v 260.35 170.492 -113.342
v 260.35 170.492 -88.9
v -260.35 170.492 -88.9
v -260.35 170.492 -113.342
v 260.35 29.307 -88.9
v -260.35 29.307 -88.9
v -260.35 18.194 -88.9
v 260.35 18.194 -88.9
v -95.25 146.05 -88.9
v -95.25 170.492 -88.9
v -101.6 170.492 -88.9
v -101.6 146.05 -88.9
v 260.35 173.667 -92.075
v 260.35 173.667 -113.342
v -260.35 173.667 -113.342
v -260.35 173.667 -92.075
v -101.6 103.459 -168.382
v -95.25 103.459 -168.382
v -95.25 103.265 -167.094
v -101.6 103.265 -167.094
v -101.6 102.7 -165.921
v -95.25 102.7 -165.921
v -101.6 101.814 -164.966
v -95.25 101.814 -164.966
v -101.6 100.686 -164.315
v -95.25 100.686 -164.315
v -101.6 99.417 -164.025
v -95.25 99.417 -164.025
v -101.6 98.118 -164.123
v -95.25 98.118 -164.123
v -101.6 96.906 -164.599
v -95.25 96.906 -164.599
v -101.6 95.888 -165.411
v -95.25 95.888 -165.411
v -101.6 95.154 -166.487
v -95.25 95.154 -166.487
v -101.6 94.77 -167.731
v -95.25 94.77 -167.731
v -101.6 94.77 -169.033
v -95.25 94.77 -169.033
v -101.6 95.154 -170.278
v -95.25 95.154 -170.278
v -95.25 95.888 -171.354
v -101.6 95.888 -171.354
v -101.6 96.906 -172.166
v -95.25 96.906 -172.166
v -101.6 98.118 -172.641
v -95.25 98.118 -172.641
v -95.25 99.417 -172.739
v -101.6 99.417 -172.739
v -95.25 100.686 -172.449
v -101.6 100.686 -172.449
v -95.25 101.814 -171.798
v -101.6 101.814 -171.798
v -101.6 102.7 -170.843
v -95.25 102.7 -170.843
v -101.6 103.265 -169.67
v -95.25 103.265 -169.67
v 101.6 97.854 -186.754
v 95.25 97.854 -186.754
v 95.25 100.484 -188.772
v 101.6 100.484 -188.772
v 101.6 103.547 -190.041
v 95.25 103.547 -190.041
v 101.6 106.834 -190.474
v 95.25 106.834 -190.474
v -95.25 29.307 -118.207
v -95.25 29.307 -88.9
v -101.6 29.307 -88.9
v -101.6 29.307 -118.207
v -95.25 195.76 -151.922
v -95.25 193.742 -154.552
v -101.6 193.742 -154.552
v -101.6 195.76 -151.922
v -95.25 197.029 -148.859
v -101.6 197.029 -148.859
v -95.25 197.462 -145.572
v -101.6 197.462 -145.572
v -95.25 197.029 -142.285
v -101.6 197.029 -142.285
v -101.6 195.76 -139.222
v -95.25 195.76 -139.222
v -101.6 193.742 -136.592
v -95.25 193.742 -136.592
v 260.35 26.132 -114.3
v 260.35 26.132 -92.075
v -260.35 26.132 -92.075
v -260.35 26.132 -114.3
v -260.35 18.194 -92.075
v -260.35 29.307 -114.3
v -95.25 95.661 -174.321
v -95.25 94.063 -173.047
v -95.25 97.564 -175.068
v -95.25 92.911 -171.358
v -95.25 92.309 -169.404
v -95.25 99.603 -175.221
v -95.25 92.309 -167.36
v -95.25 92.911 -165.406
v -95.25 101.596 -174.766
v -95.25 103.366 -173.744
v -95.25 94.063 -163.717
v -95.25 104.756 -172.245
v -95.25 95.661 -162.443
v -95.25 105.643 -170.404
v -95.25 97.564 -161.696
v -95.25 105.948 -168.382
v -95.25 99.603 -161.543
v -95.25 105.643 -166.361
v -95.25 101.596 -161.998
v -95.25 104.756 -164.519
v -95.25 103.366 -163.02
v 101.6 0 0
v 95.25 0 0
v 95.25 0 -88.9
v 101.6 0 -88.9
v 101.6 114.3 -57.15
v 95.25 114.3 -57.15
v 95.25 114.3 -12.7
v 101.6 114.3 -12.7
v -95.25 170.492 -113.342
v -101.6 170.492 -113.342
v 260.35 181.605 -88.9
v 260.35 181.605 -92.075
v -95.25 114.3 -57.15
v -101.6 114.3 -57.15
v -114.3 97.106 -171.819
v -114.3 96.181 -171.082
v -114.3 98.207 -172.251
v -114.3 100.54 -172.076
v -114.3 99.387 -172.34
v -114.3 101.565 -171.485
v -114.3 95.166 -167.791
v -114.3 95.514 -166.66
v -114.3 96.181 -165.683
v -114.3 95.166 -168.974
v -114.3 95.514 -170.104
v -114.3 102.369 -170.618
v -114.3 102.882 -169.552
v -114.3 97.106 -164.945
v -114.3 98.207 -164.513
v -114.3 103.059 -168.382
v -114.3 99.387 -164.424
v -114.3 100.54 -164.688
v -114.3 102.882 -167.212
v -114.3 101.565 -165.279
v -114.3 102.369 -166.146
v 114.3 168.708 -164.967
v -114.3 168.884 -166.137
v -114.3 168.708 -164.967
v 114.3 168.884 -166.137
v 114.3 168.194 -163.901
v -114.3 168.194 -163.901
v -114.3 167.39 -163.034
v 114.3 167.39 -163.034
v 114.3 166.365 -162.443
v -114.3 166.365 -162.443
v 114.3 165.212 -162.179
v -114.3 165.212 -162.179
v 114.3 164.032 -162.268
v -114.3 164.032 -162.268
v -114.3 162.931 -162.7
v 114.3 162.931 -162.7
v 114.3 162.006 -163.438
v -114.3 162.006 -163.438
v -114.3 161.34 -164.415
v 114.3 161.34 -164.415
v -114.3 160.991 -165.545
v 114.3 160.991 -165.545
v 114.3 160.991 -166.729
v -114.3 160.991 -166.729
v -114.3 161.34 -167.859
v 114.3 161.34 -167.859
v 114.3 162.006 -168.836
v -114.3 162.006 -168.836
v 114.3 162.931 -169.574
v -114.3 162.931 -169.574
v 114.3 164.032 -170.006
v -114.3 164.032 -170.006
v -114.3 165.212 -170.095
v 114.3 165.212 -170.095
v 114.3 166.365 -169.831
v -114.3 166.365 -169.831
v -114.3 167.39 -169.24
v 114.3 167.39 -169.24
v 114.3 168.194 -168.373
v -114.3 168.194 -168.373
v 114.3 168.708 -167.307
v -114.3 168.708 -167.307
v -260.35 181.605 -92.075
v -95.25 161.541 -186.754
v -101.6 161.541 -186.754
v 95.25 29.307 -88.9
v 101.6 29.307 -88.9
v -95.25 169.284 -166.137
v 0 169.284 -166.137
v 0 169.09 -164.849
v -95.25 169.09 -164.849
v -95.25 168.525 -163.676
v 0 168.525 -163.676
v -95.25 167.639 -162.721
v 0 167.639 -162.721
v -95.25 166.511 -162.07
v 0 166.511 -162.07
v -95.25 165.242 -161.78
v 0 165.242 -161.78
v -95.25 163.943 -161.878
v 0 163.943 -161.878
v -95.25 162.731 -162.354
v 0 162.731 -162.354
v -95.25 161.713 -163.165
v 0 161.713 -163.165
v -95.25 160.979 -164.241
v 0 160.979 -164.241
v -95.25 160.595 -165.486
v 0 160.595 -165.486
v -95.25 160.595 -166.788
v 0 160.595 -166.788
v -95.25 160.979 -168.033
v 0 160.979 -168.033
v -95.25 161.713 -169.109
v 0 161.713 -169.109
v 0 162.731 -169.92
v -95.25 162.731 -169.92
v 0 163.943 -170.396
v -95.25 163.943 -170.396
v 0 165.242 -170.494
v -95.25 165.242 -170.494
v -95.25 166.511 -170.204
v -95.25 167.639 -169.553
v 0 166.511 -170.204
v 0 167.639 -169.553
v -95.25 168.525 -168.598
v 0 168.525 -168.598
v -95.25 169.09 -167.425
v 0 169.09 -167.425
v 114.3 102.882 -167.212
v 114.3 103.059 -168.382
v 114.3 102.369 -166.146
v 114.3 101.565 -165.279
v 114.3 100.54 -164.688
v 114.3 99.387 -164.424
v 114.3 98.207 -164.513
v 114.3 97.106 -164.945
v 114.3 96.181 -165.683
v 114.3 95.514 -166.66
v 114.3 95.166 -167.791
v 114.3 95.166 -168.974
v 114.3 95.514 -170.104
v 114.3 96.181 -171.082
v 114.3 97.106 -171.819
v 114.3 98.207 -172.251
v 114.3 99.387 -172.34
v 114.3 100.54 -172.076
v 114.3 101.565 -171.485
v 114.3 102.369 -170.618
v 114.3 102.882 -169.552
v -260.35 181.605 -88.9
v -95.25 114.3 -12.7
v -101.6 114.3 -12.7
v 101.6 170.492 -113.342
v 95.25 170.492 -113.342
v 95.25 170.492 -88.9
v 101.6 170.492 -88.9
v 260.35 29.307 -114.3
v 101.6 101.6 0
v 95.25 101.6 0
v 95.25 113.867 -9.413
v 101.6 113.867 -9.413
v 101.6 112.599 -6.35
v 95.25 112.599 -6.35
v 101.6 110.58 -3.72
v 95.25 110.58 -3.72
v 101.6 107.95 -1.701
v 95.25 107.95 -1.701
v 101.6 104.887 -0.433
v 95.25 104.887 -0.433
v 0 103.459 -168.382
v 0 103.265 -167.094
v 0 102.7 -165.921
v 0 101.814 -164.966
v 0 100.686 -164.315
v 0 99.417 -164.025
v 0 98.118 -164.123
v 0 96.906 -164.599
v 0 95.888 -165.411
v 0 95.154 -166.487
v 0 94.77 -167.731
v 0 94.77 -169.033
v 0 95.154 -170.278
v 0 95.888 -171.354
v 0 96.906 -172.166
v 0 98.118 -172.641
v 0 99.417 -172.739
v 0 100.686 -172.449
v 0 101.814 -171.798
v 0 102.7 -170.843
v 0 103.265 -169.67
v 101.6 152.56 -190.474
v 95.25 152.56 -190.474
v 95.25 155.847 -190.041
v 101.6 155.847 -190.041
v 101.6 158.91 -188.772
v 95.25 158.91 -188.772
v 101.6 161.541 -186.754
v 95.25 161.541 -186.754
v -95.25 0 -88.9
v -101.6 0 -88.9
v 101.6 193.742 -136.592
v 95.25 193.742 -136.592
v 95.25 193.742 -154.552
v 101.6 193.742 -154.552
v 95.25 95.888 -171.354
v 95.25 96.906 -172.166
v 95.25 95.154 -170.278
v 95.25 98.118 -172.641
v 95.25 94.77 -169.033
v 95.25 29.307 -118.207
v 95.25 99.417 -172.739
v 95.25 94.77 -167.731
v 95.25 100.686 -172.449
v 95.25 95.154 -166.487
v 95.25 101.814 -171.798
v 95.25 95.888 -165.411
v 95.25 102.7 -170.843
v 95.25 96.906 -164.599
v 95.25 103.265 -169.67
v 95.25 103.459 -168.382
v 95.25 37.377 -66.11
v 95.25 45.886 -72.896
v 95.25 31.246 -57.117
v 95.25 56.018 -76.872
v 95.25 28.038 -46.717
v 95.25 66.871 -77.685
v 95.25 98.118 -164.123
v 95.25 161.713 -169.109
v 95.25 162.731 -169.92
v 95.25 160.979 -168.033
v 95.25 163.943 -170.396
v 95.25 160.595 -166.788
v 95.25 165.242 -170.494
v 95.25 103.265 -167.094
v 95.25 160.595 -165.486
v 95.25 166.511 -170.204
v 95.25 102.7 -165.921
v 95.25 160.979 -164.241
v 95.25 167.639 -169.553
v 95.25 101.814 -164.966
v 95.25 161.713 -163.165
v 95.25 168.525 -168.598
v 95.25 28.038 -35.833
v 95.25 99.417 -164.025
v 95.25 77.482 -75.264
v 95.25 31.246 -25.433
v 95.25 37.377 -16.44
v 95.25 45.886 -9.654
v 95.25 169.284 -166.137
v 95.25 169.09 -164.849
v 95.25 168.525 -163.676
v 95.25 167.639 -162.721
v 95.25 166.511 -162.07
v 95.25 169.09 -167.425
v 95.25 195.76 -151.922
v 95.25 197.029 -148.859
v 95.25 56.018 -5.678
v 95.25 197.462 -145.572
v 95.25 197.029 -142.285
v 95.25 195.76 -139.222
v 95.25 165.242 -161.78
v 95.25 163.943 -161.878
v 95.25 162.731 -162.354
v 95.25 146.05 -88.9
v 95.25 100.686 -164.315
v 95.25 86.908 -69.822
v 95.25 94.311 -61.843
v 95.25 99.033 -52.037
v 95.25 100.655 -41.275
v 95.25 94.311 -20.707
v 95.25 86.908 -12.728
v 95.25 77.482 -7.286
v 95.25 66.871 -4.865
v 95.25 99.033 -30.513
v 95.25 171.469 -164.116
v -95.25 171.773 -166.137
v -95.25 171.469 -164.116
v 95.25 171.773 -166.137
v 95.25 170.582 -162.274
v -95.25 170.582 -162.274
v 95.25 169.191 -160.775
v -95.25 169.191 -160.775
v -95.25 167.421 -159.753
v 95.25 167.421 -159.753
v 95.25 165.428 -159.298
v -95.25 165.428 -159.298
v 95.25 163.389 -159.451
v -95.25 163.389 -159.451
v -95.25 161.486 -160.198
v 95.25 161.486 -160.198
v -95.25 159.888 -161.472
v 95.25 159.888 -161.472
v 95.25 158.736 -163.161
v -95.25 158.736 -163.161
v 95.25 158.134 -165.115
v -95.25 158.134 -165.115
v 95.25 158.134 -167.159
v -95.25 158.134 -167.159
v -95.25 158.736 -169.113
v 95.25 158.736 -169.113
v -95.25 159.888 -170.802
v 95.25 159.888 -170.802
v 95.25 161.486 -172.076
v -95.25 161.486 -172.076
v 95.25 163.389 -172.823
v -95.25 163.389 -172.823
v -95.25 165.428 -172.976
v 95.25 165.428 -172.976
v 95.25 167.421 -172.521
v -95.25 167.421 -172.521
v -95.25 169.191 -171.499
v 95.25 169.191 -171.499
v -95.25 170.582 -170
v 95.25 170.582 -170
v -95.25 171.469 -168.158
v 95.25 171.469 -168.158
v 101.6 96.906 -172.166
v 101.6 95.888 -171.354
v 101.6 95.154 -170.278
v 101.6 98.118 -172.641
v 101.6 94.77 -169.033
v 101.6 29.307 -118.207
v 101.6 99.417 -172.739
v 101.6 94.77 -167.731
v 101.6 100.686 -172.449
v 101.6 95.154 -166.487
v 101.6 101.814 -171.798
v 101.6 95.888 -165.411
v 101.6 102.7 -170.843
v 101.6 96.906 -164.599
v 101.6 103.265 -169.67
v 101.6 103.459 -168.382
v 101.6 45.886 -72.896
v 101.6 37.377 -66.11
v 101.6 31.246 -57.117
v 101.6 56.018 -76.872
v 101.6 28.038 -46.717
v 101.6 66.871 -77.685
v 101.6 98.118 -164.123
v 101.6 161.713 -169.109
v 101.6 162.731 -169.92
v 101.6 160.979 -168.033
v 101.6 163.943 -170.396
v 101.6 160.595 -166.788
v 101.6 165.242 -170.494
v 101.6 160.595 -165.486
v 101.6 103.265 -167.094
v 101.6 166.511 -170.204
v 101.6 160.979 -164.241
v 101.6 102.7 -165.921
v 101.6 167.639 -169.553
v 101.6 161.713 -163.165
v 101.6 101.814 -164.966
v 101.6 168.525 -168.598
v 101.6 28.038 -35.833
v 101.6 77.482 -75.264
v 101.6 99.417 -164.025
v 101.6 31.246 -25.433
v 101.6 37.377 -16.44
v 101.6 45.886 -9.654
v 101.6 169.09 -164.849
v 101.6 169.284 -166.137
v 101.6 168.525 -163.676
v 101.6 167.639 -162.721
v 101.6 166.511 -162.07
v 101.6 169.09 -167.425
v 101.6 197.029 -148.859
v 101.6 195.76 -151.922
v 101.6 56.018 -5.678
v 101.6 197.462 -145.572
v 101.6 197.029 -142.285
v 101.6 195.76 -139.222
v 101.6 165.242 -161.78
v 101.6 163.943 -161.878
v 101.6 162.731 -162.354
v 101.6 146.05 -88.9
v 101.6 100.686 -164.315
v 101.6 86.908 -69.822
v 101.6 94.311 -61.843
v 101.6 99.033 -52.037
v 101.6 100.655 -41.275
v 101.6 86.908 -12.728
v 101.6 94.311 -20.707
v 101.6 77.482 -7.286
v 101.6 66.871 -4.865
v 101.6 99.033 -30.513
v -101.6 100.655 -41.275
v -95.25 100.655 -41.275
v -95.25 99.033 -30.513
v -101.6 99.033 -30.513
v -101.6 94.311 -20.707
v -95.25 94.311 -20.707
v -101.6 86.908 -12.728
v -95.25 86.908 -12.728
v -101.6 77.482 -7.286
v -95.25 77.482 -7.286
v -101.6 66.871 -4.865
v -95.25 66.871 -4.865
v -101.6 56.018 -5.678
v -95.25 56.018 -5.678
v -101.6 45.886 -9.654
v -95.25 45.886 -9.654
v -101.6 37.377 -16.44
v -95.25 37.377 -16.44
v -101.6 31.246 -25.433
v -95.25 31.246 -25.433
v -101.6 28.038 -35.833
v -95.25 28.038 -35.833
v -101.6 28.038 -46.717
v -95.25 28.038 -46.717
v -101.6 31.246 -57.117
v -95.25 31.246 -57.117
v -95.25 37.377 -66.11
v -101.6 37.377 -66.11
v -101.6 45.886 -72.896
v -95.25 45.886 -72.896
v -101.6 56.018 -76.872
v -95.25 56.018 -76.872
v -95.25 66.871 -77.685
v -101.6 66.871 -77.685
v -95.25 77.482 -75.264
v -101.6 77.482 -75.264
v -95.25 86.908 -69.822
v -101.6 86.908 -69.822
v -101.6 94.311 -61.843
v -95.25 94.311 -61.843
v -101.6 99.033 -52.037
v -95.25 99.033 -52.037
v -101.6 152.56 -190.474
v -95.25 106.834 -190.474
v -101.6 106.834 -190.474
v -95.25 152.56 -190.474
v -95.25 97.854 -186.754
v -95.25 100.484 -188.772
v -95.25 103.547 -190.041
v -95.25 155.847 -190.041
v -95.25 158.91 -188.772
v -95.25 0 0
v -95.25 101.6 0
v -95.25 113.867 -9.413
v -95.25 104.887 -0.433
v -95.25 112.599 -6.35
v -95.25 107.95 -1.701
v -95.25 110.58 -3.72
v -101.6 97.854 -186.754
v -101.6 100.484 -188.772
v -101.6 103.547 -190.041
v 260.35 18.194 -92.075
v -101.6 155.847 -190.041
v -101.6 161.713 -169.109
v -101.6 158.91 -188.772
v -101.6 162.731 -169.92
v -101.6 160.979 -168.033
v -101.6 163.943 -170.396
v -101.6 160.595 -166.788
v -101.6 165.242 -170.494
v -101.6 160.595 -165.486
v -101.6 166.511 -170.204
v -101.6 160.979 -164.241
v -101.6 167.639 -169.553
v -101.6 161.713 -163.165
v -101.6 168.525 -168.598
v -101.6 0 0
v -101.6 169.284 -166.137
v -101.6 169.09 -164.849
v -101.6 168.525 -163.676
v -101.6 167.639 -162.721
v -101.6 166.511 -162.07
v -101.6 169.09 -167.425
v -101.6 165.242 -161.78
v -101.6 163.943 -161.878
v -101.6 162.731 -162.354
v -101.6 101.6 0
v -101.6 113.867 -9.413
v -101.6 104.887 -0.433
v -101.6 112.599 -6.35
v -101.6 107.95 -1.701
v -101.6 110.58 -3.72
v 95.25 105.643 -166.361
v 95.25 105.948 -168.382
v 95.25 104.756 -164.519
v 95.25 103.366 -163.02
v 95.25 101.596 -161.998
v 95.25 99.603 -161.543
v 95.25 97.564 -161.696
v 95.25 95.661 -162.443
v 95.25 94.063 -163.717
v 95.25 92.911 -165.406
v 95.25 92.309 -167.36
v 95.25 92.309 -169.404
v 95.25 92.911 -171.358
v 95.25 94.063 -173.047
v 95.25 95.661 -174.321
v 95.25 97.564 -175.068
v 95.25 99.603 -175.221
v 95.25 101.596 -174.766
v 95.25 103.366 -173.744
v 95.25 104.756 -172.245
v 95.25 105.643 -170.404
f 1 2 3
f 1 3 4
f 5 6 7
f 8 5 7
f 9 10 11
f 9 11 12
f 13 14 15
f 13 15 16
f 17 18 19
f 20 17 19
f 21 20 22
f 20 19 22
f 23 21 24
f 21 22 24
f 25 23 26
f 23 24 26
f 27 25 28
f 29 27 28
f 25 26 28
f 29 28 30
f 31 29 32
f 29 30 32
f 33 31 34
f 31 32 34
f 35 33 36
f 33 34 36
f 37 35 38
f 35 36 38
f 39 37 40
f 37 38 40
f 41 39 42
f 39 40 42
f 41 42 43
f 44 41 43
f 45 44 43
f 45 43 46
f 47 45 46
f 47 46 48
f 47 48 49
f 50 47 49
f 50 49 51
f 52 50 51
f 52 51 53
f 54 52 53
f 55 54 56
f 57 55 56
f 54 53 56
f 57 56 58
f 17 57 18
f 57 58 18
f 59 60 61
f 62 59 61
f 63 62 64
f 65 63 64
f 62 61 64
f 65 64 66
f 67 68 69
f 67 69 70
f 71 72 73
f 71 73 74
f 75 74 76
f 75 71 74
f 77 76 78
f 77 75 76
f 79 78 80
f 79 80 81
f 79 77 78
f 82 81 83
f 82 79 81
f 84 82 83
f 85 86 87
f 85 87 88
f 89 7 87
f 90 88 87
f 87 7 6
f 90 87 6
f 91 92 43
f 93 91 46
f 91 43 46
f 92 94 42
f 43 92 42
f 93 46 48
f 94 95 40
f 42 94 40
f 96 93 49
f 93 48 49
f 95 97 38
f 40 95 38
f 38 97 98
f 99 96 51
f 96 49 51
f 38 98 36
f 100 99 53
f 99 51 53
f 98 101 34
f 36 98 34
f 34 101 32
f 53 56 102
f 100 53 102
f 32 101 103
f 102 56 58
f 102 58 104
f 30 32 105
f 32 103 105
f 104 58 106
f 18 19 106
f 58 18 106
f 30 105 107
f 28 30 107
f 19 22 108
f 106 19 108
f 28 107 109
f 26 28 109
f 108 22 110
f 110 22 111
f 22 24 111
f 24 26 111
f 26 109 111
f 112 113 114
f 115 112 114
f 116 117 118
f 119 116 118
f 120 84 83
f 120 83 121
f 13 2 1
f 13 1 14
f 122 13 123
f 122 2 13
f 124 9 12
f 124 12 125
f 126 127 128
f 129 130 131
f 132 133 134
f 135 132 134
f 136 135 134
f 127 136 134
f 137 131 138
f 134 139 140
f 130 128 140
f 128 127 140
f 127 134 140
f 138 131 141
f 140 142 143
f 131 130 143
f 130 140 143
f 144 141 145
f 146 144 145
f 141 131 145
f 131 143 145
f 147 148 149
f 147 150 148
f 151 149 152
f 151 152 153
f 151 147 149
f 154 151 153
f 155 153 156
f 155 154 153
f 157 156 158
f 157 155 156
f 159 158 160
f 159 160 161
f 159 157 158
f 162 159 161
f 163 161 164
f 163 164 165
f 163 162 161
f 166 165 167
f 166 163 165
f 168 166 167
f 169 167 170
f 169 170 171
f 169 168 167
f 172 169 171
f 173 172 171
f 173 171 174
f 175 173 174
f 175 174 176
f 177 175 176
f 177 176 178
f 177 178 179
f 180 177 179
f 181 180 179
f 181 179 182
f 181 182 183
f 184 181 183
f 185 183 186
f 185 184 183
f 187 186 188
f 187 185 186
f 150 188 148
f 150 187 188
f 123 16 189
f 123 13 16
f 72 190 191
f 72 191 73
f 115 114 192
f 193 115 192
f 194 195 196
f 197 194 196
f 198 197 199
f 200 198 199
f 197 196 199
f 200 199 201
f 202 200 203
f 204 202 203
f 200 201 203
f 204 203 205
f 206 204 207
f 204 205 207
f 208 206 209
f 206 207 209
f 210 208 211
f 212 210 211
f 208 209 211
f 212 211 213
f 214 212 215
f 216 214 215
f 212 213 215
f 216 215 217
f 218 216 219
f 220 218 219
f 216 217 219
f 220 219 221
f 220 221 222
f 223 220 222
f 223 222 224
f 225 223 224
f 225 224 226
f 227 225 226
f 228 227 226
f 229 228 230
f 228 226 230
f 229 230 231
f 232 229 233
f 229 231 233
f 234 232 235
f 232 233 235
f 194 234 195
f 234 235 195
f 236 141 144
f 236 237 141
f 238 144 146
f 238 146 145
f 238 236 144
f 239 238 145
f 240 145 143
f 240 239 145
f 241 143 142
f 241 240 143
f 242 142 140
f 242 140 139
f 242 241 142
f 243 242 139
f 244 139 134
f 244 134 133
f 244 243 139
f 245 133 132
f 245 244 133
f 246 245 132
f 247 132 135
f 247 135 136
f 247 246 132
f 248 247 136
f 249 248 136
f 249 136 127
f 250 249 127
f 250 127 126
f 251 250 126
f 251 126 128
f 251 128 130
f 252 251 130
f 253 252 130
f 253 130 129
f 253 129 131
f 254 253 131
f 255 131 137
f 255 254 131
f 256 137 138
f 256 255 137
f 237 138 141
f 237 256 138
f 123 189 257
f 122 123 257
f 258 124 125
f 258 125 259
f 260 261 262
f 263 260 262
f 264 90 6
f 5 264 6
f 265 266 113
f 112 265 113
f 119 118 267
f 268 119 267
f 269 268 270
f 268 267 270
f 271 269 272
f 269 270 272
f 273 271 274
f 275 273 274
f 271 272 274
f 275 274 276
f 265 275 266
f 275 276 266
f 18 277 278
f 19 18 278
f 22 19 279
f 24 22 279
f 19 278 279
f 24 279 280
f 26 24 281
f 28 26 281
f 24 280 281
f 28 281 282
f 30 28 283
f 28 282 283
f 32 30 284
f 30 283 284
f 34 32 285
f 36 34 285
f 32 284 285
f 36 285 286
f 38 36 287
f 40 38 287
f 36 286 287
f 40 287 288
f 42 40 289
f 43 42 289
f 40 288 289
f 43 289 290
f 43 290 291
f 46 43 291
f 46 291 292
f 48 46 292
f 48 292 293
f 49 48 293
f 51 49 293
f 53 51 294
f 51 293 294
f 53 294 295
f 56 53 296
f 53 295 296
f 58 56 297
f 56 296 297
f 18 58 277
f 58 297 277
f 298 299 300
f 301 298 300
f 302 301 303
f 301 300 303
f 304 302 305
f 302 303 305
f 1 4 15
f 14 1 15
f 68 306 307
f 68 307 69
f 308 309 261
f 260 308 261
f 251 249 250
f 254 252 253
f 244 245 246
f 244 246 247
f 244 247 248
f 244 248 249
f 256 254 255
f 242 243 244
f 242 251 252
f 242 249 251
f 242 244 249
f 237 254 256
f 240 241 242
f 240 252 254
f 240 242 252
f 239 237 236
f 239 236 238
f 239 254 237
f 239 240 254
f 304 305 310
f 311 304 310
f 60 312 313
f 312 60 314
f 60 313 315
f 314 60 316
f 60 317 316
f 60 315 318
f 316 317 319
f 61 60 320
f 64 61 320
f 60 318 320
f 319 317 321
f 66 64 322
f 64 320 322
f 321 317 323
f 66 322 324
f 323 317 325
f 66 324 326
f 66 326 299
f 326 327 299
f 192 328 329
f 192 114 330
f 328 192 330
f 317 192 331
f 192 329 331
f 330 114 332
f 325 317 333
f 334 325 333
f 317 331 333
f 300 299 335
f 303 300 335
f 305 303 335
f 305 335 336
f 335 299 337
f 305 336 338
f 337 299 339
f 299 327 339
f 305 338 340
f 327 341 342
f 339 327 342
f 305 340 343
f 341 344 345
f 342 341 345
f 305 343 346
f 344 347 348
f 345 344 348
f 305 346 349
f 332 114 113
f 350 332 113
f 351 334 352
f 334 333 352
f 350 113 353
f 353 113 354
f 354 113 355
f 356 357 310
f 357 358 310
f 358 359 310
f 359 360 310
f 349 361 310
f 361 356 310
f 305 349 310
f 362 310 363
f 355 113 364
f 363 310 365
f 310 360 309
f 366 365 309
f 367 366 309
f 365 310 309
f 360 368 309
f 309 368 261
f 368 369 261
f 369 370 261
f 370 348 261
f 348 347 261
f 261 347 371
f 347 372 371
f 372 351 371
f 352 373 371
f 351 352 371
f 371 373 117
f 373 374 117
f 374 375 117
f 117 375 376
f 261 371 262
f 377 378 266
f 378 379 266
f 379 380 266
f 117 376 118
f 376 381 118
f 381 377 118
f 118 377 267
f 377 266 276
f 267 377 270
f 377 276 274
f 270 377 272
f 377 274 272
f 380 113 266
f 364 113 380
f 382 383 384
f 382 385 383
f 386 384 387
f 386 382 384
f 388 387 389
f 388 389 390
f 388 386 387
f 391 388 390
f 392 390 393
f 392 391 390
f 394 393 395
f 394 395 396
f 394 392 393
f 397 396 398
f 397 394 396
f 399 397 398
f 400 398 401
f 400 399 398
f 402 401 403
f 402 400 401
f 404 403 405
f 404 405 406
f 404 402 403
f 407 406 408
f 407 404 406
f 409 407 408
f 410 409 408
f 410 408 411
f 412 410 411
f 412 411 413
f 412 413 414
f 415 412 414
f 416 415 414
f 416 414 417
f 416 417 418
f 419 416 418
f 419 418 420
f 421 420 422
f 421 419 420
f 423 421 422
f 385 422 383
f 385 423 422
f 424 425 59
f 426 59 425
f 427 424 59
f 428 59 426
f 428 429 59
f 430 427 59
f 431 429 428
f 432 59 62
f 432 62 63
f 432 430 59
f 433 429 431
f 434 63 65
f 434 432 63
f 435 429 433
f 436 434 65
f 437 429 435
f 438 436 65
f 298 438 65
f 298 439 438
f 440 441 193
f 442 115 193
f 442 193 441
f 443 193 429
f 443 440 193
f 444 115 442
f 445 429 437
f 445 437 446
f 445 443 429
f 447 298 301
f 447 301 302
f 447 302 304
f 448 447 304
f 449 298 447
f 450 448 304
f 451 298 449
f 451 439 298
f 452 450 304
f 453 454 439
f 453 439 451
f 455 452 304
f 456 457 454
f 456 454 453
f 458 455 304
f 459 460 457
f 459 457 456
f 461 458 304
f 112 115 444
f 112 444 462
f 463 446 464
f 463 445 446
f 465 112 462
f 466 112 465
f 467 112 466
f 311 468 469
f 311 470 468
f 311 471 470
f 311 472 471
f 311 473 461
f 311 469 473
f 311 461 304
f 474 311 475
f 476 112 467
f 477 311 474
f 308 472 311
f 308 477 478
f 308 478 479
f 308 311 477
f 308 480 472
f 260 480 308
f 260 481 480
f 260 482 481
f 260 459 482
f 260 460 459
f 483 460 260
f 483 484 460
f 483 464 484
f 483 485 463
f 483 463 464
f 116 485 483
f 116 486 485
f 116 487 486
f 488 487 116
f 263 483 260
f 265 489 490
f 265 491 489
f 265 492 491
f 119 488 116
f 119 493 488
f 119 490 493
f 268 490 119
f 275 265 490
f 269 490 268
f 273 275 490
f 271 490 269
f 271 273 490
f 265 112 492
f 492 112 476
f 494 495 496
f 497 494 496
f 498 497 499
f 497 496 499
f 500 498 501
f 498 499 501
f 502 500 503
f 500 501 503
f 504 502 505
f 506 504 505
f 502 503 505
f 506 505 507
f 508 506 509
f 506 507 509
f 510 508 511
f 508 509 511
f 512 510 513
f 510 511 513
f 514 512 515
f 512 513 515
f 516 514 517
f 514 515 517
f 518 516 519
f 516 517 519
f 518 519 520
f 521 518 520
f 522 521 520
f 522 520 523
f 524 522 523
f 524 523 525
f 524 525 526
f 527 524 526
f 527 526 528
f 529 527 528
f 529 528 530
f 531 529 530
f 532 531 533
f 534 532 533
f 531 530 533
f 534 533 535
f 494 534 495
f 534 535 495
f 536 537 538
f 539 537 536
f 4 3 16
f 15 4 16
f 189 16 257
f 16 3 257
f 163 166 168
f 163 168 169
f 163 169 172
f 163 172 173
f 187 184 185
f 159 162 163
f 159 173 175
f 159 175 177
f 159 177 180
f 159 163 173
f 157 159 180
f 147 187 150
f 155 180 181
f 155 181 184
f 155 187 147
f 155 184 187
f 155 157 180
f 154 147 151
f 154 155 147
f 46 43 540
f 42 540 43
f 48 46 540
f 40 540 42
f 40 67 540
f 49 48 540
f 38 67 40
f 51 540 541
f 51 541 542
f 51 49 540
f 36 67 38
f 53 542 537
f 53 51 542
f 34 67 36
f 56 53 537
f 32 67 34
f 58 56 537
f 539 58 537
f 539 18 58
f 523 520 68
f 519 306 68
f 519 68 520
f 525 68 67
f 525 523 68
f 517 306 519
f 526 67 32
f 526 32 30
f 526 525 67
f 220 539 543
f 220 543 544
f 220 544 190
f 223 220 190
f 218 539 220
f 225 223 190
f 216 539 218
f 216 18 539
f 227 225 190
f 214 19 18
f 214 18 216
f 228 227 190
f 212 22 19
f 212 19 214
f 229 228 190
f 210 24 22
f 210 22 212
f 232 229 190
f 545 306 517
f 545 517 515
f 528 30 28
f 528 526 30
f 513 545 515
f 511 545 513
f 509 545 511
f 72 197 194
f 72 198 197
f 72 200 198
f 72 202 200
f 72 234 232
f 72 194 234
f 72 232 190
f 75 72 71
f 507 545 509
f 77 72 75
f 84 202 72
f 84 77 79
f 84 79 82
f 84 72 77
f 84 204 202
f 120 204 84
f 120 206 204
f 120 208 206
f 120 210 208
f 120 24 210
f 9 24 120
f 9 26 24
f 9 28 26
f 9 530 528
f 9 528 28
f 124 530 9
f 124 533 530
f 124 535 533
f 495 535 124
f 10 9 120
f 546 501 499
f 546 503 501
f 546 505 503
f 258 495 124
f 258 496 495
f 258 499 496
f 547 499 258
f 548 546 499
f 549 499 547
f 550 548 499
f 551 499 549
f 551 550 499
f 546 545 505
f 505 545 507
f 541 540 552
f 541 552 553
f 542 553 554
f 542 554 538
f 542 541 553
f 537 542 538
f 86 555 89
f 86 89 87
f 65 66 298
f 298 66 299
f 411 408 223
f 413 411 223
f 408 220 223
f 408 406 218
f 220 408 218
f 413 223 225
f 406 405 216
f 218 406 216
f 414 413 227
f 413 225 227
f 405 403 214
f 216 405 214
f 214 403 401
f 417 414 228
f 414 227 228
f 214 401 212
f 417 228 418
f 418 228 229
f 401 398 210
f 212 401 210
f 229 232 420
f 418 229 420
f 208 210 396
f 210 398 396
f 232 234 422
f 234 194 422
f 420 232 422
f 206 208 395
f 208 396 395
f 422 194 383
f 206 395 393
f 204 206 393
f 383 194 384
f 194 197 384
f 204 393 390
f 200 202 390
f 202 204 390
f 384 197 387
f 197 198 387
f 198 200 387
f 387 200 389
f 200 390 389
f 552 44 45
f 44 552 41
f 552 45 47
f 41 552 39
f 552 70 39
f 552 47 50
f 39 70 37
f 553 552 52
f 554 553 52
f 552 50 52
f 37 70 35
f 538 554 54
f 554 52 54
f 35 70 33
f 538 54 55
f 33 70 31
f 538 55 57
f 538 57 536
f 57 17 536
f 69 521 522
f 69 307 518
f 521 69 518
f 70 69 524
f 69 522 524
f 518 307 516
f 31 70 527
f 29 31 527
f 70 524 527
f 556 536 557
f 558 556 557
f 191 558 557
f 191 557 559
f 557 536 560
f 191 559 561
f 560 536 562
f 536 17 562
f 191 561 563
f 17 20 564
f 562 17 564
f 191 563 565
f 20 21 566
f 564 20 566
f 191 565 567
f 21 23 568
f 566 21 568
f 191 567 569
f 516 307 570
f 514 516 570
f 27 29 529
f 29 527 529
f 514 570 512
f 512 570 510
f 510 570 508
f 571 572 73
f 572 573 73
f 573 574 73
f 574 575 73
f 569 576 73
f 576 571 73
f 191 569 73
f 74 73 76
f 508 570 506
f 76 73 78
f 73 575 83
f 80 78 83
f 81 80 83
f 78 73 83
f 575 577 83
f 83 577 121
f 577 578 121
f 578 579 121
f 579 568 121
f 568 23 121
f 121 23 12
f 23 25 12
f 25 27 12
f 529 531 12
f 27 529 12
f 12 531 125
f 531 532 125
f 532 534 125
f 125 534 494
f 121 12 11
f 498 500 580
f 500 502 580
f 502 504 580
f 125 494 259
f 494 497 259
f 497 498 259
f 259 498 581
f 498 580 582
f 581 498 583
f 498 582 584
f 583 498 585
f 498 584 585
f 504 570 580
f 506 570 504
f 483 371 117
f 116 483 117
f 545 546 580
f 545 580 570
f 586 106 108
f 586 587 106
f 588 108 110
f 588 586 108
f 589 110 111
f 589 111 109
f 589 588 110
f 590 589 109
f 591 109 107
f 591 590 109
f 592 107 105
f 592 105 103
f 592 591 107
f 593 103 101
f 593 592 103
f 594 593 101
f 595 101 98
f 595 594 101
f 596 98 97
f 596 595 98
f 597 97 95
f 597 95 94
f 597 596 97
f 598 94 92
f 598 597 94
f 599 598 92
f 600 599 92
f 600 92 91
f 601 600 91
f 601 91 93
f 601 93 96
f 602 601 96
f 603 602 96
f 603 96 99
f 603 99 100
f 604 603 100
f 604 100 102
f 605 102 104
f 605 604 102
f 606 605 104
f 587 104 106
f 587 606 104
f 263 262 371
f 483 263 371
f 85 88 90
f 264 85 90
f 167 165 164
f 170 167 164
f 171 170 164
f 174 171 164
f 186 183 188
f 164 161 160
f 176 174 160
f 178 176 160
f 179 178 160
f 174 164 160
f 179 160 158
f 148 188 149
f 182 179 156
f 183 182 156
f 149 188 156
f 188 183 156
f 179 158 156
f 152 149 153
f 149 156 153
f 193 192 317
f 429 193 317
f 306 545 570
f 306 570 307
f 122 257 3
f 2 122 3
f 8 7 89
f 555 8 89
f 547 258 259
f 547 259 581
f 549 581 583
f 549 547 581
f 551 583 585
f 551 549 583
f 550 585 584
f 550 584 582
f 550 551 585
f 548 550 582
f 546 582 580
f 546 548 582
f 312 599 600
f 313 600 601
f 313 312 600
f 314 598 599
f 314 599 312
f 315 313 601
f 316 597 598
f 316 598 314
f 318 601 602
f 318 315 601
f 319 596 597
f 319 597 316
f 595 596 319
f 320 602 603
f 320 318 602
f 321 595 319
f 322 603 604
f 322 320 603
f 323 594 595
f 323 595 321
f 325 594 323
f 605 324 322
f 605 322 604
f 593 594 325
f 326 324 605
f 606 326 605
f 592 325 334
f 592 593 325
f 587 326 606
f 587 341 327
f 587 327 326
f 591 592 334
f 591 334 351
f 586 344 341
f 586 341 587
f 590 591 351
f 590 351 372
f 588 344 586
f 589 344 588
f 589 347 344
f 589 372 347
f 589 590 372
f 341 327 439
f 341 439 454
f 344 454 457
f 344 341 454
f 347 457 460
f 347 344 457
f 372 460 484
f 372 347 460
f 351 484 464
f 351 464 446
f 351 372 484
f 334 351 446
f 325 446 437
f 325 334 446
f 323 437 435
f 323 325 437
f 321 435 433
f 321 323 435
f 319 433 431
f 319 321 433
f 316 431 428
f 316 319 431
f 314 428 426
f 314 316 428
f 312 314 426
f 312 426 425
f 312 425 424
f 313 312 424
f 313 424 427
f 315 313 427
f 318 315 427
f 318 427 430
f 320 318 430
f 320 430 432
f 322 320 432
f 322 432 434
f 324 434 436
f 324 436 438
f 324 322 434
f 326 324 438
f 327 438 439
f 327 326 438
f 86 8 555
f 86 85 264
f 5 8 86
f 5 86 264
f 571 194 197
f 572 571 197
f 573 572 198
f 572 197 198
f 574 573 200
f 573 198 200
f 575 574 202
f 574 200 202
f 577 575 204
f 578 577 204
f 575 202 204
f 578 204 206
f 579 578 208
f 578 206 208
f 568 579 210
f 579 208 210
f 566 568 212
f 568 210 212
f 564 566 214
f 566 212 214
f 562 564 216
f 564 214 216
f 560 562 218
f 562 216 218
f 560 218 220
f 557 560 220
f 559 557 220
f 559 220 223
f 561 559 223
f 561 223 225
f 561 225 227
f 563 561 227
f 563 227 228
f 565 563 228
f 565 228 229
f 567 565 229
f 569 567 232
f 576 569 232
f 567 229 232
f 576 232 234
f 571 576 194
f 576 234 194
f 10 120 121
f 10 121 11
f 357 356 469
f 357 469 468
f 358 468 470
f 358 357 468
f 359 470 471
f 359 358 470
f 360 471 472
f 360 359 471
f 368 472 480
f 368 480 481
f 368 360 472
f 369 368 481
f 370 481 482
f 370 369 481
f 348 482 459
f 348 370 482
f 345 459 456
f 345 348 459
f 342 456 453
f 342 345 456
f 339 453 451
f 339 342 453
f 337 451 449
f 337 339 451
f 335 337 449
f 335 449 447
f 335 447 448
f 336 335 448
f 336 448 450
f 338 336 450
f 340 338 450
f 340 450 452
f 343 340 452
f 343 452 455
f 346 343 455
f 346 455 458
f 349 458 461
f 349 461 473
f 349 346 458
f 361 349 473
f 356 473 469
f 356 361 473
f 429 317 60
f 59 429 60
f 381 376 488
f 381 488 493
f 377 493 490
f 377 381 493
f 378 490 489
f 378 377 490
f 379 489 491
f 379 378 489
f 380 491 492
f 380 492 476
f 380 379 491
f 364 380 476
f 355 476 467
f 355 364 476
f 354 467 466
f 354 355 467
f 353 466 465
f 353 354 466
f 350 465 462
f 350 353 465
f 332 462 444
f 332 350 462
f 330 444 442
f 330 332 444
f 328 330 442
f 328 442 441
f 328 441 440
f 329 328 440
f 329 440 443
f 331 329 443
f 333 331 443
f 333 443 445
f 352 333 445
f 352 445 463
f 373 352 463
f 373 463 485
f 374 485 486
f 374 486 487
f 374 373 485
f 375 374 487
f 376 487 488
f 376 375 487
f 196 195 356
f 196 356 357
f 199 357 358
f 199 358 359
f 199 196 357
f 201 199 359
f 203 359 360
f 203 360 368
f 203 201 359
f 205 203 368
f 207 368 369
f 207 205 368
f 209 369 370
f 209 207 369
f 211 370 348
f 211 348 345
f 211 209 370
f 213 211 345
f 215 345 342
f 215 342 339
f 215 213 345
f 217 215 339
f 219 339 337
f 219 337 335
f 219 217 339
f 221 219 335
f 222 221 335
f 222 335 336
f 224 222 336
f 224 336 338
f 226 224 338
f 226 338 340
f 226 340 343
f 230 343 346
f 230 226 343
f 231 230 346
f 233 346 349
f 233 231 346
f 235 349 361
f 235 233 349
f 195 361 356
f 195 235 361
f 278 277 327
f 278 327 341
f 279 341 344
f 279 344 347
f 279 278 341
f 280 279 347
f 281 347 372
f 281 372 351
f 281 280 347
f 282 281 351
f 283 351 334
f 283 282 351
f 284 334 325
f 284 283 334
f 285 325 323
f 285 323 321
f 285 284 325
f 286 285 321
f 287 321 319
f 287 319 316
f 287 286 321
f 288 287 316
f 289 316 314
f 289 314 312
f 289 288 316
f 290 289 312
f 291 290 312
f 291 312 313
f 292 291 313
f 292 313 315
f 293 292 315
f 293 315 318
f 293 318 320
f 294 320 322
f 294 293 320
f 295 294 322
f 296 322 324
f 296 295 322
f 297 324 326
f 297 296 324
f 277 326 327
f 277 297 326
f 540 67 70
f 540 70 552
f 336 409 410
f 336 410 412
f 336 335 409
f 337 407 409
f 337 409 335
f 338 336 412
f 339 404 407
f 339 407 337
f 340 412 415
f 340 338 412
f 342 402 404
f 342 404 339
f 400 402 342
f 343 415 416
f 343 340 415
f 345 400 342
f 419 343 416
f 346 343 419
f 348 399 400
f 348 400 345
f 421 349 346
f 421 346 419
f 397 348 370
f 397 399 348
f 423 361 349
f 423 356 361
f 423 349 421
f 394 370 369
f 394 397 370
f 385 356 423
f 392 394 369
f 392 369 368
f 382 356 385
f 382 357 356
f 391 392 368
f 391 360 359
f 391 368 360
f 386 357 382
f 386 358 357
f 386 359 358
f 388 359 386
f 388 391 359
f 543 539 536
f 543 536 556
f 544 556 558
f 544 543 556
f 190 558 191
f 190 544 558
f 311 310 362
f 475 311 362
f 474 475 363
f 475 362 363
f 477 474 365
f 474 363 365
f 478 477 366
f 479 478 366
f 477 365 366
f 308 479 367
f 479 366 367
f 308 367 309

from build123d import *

# Parameters (mm, degrees)
F4_DEPTH      = 260.35
F4_DEPTH_BACK = 260.35
F2_R          = 6.858
F2_R_2        = 4.3688
F5_DEPTH      = 95.25
F5_DEPTH_BACK = 95.25
F2_R_3        = 3.96875
F6_DEPTH      = 114.3
F6_DEPTH_BACK = 114.3
F7_R          = 4.3688
F7_R_2        = 6.858
F7_R_3        = 36.5125
F8_DEPTH      = 6.35


# Not quite as in the source:
# - a variable given as a bare number and used for a length is read in inches; the dataset says mm whatever the document's units were


with BuildPart() as f4:
    # F2 (on Right) → F4 (new body, two sides)
    with BuildSketch(Plane.YZ) as f4_sk:
        Polygon((29.3066704261, -88.9), (18.1941704261, -88.9), (18.1941704261, -92.075), (26.1316704261, -92.075), (26.1316704261, -114.3), (29.3066704261, -114.3), align=None)
    extrude(amount=F4_DEPTH)
    extrude(f4_sk.sketch, amount=-F4_DEPTH_BACK)


with BuildPart() as f4b:
    # F2 (on Right) → F4, piece 2 (new body, two sides)
    with BuildSketch(Plane.YZ) as f4_2_sk:
        Polygon((181.6048598051, -88.9), (170.4923598051, -88.9), (170.4923598051, -113.3423598051), (173.6673598051, -113.3423598051), (173.6673598051, -92.075), (181.6048598051, -92.075), align=None)
    extrude(amount=F4_DEPTH)
    extrude(f4_2_sk.sketch, amount=-F4_DEPTH_BACK)


with BuildPart() as f5:
    # F2 (on Right) → F5 (new body, two sides)
    with BuildSketch(Plane.YZ) as f5_sk:
        with Locations((164.9153412521, -166.1370060391)):
            Circle(F2_R)
        with Locations((164.9153412521, -166.1370060391)):
            Circle(F2_R_2, mode=Mode.SUBTRACT)
    extrude(amount=F5_DEPTH)
    extrude(f5_sk.sketch, amount=-F5_DEPTH_BACK)


with BuildPart() as f5b:
    # F2 (on Right) → F5, piece 2 (new body, two sides)
    with BuildSketch(Plane.YZ) as f5_2_sk:
        with Locations((99.0900638847, -168.3820700693)):
            Circle(F2_R)
        with Locations((99.0900638847, -168.3820700693)):
            Circle(F2_R_2, mode=Mode.SUBTRACT)
    extrude(amount=F5_DEPTH)
    extrude(f5_2_sk.sketch, amount=-F5_DEPTH_BACK)


with BuildPart() as f6:
    # F2 (on Right) → F6 (new body, two sides)
    with BuildSketch(Plane.YZ) as f6_sk:
        with Locations((99.0900638847, -168.3820700693)):
            Circle(F2_R_3)
    extrude(amount=F6_DEPTH)
    extrude(f6_sk.sketch, amount=-F6_DEPTH_BACK)


with BuildPart() as f6b:
    # F2 (on Right) → F6, piece 2 (new body, two sides)
    with BuildSketch(Plane.YZ) as f6_2_sk:
        with Locations((164.9153412521, -166.1370060391)):
            Circle(F2_R_3)
    extrude(amount=F6_DEPTH)
    extrude(f6_2_sk.sketch, amount=-F6_DEPTH_BACK)


with BuildPart() as f8:
    # F7 (on face) → F8 (new body)
    with BuildSketch(Plane.YZ.offset(95.25)):
        with BuildLine():
            ThreePointArc((97.8537562482, -186.7537562482), (101.9739327783, -189.5067701901), (106.8340123693, -190.4735001272))
            Line((106.8340123693, -190.4735001272), (152.5604266743, -190.4735001272))
            ThreePointArc((152.5604266743, -190.4735001272), (157.4205062654, -189.5067701901), (161.5406827954, -186.7537562482))
            Line((161.5406827954, -186.7537562482), (193.7419634008, -154.5524756429))
            ThreePointArc((193.7419634008, -154.5524756429), (197.4617072797, -145.5722195218), (193.7419634008, -136.5919634008))
            Line((193.7419634008, -136.5919634008), (170.4923598051, -113.3423598051))
            Line((170.4923598051, -113.3423598051), (170.4923598051, -88.9))
            Line((170.4923598051, -88.9), (146.05, -88.9))
            Line((146.05, -88.9), (114.3, -57.15))
            Line((114.3, -57.15), (114.3, -12.7))
            ThreePointArc((114.3, -12.7), (110.5802561211, -3.7197438789), (101.6, 0))
            Line((101.6, 0), (0, 0))
            Line((0, 0), (0, -88.9))
            Line((0, -88.9), (29.3066704261, -88.9))
            Line((29.3066704261, -88.9), (29.3066704261, -118.2066704261))
            Line((29.3066704261, -118.2066704261), (97.8537562482, -186.7537562482))
        make_face()
        with Locations((99.0900638847, -168.3820700693)):
            Circle(F7_R, mode=Mode.SUBTRACT)
        with Locations((164.9153412521, -166.1370060391)):
            Circle(F7_R_2, mode=Mode.SUBTRACT)
        with Locations((64.14262, -41.275)):
            Circle(F7_R_3, mode=Mode.SUBTRACT)
        with Locations((164.9153412521, -166.1370060391)):
            Circle(F7_R_2)
        with Locations((164.9153412521, -166.1370060391)):
            Circle(F7_R, mode=Mode.SUBTRACT)
    extrude(amount=F8_DEPTH)


with BuildPart() as f9_1:
    # F9: instance of F8
    add(f8.part.mirror(Plane.YZ))


solid = Compound([f4.part, f4b.part, f5.part, f5b.part, f6.part, f6b.part, f8.part, f9_1.part])
